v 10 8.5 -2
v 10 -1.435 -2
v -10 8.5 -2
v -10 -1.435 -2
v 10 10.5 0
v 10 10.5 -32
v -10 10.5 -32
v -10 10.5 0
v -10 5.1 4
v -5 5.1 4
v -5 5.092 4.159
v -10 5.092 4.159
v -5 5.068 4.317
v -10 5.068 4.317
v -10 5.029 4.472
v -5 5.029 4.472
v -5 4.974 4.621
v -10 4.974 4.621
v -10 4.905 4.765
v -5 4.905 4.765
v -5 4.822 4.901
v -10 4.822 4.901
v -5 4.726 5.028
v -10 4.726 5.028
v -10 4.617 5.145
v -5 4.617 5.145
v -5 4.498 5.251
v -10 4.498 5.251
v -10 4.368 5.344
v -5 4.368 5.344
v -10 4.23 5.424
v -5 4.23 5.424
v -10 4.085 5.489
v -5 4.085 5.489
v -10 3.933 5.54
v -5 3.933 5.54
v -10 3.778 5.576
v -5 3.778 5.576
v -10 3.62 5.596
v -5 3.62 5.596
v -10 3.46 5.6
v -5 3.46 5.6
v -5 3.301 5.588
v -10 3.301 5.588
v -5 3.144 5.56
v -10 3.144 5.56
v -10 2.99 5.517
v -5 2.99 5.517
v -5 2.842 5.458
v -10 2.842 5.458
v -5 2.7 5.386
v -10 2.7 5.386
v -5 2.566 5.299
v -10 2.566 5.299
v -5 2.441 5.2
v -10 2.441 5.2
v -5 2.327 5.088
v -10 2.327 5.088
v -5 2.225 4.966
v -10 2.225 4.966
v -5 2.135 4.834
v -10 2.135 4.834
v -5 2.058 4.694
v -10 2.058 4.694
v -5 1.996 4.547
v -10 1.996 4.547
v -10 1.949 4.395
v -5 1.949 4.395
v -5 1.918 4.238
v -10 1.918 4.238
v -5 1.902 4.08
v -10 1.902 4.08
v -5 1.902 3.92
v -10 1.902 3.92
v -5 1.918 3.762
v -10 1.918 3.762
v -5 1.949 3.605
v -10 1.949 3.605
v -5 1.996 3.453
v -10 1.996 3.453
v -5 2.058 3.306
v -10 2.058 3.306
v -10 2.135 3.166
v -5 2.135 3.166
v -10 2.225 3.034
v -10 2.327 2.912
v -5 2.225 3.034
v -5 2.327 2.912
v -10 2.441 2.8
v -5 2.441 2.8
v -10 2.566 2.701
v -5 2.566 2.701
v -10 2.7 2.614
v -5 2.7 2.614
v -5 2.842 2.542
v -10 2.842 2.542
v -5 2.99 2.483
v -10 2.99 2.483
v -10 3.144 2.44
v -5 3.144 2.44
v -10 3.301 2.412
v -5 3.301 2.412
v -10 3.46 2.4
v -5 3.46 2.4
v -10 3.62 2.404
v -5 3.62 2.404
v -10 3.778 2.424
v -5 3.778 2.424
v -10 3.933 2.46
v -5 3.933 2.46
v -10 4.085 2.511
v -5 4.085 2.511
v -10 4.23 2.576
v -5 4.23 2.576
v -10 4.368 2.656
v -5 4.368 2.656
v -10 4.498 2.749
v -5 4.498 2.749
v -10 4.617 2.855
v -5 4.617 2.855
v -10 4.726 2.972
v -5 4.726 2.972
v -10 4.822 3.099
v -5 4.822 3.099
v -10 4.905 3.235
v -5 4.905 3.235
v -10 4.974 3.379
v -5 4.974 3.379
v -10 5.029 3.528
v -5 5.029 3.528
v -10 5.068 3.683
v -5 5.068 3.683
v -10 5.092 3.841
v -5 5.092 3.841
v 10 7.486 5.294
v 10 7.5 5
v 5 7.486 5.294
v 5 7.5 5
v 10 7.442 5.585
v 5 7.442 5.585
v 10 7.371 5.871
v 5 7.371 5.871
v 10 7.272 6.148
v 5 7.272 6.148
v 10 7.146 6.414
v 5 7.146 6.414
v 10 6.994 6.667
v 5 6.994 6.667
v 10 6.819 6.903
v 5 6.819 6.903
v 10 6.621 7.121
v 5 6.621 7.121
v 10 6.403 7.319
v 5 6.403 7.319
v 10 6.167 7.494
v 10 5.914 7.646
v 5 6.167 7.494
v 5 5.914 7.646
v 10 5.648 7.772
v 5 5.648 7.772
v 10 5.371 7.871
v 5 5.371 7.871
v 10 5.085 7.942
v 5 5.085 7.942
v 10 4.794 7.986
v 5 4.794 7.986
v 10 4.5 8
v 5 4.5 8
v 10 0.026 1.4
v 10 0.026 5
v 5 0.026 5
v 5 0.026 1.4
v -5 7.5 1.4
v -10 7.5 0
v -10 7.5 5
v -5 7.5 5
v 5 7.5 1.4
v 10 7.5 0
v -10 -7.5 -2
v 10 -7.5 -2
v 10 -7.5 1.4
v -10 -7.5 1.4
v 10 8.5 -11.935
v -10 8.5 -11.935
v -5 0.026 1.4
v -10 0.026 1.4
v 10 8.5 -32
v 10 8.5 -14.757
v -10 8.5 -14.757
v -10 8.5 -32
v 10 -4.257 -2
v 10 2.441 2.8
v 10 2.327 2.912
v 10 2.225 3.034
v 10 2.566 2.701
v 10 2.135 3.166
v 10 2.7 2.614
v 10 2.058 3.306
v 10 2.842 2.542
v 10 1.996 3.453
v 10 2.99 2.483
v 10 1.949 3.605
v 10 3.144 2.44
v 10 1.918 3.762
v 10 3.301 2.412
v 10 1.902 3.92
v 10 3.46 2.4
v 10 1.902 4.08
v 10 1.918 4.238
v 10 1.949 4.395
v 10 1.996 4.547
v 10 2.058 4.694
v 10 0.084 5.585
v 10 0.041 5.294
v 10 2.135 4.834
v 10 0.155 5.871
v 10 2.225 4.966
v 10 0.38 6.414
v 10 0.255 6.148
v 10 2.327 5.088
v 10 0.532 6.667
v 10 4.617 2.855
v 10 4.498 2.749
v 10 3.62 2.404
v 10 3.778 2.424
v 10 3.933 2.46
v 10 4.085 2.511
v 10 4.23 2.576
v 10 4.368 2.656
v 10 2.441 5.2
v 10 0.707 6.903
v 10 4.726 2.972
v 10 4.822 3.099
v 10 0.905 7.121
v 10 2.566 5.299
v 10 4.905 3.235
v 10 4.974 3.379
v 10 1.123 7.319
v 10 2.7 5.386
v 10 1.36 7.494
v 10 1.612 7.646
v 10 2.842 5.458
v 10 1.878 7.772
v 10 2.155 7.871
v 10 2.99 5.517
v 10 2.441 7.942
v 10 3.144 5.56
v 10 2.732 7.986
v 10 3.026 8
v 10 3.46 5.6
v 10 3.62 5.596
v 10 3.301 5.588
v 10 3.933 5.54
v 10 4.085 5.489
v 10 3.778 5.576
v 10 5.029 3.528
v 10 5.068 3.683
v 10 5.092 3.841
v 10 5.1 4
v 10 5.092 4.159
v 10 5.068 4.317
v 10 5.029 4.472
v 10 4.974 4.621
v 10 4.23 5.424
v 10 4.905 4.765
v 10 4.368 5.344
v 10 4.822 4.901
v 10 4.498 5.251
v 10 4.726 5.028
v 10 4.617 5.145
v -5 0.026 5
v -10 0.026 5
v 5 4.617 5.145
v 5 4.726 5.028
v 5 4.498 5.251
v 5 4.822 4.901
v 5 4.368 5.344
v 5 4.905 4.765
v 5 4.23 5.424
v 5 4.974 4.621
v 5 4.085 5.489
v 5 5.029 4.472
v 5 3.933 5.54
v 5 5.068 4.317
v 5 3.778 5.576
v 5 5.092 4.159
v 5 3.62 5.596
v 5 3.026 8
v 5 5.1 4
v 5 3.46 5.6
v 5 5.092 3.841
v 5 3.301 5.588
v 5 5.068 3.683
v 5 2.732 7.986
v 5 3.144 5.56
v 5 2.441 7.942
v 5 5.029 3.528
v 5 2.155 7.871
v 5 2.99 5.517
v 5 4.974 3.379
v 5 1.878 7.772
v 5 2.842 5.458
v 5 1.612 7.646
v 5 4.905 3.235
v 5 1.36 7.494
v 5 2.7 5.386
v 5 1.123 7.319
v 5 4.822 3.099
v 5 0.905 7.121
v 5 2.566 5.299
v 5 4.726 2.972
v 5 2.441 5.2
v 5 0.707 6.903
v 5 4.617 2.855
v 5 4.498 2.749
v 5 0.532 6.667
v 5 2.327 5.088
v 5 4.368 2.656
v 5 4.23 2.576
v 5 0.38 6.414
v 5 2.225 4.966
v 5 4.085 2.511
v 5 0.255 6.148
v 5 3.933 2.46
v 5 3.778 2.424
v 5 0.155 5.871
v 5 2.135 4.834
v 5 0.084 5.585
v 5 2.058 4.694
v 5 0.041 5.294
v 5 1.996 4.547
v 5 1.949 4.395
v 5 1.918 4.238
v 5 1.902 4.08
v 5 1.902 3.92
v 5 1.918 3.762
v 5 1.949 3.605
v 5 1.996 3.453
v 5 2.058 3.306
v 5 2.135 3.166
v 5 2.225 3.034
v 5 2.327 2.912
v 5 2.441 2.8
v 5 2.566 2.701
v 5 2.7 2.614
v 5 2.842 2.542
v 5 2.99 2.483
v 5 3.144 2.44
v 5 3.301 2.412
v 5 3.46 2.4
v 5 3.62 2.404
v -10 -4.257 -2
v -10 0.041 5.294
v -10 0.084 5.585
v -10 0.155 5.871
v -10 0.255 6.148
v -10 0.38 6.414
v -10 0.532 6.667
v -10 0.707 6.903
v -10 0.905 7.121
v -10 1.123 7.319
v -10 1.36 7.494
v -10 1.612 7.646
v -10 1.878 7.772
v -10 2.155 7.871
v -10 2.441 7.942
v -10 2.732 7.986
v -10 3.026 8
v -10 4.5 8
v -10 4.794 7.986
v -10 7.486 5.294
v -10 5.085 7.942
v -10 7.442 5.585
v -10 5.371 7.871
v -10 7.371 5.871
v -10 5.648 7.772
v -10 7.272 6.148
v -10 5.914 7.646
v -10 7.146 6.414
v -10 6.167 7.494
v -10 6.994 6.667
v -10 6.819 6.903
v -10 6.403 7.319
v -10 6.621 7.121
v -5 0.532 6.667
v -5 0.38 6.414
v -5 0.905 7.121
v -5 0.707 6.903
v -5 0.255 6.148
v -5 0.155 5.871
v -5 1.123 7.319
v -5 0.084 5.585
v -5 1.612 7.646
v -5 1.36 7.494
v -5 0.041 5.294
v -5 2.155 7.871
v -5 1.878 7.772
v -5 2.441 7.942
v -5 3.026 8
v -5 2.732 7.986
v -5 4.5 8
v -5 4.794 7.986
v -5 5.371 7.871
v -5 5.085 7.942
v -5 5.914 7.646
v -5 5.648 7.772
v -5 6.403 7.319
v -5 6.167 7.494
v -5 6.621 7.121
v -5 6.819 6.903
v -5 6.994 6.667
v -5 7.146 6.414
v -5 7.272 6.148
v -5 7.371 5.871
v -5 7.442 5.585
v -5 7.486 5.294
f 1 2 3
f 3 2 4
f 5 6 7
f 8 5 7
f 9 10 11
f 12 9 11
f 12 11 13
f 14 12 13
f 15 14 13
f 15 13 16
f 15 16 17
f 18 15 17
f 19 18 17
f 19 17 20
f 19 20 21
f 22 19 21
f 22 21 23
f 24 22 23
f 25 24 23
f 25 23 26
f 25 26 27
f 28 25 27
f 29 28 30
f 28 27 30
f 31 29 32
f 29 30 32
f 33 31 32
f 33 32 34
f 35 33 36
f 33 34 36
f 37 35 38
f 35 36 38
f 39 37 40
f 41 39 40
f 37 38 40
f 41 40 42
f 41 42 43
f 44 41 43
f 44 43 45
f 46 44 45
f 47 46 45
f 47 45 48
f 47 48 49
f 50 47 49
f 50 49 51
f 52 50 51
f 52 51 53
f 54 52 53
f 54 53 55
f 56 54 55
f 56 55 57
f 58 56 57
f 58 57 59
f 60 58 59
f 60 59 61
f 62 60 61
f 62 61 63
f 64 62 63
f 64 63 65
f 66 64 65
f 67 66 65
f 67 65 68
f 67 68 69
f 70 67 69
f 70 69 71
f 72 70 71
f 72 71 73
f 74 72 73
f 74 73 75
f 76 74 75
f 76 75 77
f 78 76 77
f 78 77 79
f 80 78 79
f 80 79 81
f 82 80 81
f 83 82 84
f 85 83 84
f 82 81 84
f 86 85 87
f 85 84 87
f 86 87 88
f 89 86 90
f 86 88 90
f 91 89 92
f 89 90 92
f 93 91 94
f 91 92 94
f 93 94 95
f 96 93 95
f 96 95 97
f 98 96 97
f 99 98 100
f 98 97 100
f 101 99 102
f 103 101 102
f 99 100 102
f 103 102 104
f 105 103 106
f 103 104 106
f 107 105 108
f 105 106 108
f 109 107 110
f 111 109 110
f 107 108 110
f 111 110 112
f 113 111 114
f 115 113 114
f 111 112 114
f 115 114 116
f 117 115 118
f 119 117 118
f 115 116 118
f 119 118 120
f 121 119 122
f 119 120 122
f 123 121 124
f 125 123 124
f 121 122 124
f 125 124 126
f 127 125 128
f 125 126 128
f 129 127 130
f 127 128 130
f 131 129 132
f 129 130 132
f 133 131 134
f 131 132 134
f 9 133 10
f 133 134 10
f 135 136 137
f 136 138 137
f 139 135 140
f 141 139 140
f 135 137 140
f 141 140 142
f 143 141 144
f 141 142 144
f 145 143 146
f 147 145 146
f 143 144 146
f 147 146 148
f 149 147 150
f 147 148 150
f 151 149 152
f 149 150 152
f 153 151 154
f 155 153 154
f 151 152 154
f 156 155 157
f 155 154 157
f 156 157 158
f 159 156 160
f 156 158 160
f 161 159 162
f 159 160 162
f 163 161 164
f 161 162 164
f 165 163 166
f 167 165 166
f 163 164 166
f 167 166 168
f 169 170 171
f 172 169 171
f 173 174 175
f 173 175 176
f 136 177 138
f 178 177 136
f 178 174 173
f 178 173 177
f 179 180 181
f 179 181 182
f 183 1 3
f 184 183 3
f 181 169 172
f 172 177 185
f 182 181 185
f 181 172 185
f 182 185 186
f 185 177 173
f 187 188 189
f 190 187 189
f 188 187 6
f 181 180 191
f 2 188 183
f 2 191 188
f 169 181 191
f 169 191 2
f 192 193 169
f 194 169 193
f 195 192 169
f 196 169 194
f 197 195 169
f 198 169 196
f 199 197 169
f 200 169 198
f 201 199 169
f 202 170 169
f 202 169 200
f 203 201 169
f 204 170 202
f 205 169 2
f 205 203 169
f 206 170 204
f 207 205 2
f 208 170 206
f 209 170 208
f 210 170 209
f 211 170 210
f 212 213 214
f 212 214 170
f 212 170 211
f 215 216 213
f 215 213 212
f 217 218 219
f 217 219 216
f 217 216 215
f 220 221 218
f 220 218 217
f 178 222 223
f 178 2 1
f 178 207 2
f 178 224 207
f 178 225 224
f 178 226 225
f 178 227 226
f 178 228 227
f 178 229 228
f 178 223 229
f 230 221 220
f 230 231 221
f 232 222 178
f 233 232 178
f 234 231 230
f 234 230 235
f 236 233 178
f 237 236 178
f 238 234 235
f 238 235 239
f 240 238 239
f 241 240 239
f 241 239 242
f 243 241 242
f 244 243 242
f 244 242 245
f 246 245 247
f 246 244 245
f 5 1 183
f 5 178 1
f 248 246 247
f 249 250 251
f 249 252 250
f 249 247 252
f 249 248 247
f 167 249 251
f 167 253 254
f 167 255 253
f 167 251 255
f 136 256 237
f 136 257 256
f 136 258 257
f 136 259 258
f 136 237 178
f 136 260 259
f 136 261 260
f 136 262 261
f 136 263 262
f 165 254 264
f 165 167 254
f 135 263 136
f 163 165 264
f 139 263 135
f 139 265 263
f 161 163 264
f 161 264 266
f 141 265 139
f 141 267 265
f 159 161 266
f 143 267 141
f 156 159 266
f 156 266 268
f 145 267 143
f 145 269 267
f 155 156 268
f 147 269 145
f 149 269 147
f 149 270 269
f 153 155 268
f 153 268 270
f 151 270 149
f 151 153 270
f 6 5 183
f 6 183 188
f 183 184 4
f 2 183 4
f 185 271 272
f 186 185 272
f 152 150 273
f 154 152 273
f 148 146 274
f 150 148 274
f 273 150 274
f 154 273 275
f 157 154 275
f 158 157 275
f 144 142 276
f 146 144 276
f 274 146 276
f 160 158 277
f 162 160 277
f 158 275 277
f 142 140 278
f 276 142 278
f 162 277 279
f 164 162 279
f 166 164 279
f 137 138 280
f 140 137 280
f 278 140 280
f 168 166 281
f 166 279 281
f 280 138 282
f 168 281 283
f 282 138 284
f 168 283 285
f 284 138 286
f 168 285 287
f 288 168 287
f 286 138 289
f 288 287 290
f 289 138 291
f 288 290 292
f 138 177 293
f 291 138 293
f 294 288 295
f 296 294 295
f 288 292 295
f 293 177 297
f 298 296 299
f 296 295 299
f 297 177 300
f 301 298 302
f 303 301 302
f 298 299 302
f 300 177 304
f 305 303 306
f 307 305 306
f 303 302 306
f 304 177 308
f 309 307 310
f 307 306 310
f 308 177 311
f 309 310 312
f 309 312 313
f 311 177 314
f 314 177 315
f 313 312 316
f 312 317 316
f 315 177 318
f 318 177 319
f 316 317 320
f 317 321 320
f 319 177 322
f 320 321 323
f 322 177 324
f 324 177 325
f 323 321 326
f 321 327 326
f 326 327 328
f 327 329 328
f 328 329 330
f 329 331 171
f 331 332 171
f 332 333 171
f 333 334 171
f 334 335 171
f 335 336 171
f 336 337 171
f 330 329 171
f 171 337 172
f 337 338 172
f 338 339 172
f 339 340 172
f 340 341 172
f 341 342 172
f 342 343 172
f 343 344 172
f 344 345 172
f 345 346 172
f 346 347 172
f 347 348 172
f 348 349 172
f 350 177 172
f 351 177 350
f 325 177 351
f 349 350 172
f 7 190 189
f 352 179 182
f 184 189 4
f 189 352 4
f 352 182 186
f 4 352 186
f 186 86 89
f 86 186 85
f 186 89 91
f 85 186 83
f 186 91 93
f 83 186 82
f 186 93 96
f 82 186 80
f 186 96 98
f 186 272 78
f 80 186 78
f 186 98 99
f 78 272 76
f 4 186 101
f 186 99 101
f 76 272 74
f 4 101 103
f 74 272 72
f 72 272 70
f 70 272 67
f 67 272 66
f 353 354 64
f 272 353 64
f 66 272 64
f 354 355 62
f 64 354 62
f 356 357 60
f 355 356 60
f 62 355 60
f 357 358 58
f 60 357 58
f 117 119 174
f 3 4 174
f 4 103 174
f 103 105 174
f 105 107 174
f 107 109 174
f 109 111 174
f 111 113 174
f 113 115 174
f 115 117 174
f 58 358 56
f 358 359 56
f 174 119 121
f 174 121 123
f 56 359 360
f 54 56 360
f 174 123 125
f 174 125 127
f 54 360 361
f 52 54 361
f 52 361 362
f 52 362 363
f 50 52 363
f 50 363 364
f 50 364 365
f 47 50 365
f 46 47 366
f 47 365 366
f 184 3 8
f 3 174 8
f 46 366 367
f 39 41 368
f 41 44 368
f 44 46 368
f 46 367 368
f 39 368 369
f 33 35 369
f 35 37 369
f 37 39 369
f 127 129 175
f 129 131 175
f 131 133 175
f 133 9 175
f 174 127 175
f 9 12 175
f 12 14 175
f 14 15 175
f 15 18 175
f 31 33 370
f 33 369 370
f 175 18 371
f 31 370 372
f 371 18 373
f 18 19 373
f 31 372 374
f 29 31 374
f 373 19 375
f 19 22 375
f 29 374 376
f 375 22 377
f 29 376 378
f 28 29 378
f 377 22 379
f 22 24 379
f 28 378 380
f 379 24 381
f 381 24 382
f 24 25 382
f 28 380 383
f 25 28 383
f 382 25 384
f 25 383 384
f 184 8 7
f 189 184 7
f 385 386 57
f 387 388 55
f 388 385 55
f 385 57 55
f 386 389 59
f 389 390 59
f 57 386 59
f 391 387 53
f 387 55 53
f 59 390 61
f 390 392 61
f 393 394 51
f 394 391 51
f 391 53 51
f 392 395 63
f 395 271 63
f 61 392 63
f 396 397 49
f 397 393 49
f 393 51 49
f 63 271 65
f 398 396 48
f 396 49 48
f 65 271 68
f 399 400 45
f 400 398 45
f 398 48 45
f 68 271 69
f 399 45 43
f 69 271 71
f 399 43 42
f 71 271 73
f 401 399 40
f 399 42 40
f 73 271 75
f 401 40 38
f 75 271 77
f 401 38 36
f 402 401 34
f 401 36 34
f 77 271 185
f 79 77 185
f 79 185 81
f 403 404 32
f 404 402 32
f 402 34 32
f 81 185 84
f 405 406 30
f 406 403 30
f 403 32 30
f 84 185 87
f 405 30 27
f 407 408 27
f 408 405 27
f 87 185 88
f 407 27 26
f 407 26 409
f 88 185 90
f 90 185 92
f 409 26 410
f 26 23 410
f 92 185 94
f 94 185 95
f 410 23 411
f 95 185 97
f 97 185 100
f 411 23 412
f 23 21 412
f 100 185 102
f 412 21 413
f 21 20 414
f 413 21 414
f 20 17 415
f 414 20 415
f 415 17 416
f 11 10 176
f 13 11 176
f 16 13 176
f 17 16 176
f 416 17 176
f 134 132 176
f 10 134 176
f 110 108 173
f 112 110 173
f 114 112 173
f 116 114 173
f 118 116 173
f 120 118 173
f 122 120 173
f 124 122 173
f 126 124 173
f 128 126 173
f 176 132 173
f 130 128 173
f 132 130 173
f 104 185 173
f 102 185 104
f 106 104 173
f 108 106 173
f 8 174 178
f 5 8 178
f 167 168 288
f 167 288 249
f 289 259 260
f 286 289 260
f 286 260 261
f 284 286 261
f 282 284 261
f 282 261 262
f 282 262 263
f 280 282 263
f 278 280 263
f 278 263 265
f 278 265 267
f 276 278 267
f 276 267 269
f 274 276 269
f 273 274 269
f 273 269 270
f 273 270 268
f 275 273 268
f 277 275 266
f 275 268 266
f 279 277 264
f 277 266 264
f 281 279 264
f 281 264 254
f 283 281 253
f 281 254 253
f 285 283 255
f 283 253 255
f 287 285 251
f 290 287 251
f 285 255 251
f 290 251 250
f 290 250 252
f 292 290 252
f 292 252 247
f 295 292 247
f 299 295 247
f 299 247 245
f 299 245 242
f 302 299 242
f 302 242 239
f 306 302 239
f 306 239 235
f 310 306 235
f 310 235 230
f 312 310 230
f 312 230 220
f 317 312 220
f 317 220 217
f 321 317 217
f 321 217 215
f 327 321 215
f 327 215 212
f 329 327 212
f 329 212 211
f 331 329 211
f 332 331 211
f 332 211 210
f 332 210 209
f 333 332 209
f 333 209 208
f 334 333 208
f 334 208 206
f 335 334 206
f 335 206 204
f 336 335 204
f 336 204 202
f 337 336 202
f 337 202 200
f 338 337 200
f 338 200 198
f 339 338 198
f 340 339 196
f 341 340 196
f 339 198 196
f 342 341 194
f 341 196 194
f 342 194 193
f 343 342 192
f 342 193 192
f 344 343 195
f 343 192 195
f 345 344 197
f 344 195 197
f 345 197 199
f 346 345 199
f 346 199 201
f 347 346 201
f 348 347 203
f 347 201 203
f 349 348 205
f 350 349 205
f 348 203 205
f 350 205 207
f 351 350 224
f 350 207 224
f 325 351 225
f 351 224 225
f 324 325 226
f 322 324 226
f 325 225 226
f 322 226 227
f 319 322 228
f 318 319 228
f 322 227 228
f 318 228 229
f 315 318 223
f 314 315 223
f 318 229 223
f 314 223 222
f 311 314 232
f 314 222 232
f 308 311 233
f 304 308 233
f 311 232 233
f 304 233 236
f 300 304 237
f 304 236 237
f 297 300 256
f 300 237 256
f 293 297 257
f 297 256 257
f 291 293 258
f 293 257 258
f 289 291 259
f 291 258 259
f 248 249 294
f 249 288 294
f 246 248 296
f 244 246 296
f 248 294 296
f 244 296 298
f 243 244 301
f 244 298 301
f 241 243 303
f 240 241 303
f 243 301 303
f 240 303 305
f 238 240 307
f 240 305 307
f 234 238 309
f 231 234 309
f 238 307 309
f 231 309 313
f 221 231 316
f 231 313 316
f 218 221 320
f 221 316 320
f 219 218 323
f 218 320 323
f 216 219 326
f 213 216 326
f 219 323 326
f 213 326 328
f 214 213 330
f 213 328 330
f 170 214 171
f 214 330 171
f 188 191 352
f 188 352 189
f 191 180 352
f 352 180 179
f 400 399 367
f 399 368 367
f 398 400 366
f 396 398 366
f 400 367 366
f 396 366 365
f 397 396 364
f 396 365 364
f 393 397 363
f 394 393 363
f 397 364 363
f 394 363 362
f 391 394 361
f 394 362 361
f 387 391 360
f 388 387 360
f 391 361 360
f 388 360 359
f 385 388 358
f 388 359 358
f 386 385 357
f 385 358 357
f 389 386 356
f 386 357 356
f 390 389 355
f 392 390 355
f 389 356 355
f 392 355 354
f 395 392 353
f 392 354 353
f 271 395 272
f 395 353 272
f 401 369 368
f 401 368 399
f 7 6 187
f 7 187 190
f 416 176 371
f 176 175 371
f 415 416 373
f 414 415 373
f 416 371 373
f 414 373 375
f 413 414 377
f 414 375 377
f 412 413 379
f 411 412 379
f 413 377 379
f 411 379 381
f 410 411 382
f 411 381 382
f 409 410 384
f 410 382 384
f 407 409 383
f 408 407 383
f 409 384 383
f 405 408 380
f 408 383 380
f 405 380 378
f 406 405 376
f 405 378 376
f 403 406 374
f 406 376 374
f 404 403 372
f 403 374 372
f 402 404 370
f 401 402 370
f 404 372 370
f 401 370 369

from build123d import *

# Parameters (mm, degrees)
BOSS_EXTRUDE1_DEPTH = 8
SKETCH1_3_W         = 10
SKETCH1_3_H         = 7.5
BOSS_EXTRUDE2_DEPTH = 2
SKETCH2_R           = 1.6
CUT_EXTRUDE1_DEPTH  = 23.808989456
CUT_EXTRUDE3_DEPTH  = 8
FILLET1_R           = 3
BOSS_EXTRUDE3_DEPTH = 3
SKETCH5_W           = 20
SKETCH5_H           = 2
BOSS_EXTRUDE4_DEPTH = 30
BOSS_EXTRUDE5_DEPTH = 20
BOSS_EXTRUDE6_DEPTH = 1.4


with BuildPart() as part:
    # Sketch1 → Boss-Extrude1 (new body)
    with BuildSketch(Plane.XY):
        Polygon((-10, 7.5), (-10, -7.5), (10, -7.5), (10, 7.5), (5, 7.5), (5, 0), (-5, 0), (-5, 7.5), align=None)
    extrude(amount=BOSS_EXTRUDE1_DEPTH)

    # Sketch1<3> → Boss-Extrude2 (add)
    with BuildSketch(Plane.XY):
        Polygon((-10, 7.5), (-10, -7.5), (10, -7.5), (10, 7.5), (5, 7.5), (5, 0), (-5, 0), (-5, 7.5), align=None)
        with Locations((0, 3.75)):
            Rectangle(SKETCH1_3_W, SKETCH1_3_H)
    extrude(amount=-BOSS_EXTRUDE2_DEPTH)

    # Sketch2 → Cut-Extrude1 (cut, through all)
    with BuildSketch(Plane(origin=(10, 0, 0), x_dir=(0, 0, -1), z_dir=(1, 0, 0))):
        with Locations(Location((-4, 3.5, 0), (0, 0, 90))):
            Circle(SKETCH2_R)
    extrude(amount=-CUT_EXTRUDE1_DEPTH, mode=Mode.SUBTRACT)

    # Sketch3 → Cut-Extrude3 (cut)
    with BuildSketch(Plane.XY.offset(8)):
        Polygon((10, -7.5), (10, 0.026252142), (5, 0.026252142), (5, 0), (-5, 0), (-5, 0.026252142), (-10, 0.026252142), (-10, -7.5), align=None)
    extrude(amount=-CUT_EXTRUDE3_DEPTH, mode=Mode.SUBTRACT)

    # Fillet1
    fillet1_edges = [part.edges().sort_by_distance(p)[0] for p in [
        (-7.5, 7.5, 8),
        (7.5, 0.026252142, 8),
        (7.5, 7.5, 8),
        (-7.5, 0.026252142, 8),
    ]]
    fillet(fillet1_edges, radius=FILLET1_R)

    # Sketch4 → Boss-Extrude3 (add)
    with BuildSketch(Plane(origin=(0, 7.5, 0), x_dir=(1, 0, 0), z_dir=(0, 1, 0))):
        Polygon((-5, 0), (5, 0), (10, 0), (10, 2), (-10, 2), (-10, 0), align=None)
    extrude(amount=BOSS_EXTRUDE3_DEPTH)

    # Sketch5 → Boss-Extrude4 (add)
    with BuildSketch(Plane(origin=(0, 0, -2), x_dir=(-1, 0, 0), z_dir=(0, 0, -1))):
        with Locations((0, 9.5)):
            Rectangle(SKETCH5_W, SKETCH5_H)
    extrude(amount=BOSS_EXTRUDE4_DEPTH)

    # Sketch8 → Boss-Extrude5 (add)
    with BuildSketch(Plane(origin=(10, 0, 0), x_dir=(0, 0, -1), z_dir=(1, 0, 0))):
        Polygon((14.757135199, 8.5), (11.934636095, 8.5), (2, -1.434636095), (2, -4.257135199), align=None)
    extrude(amount=-BOSS_EXTRUDE5_DEPTH)

    # Sketch9 → Boss-Extrude6 (add)
    with BuildSketch(Plane.XY):
        Polygon((-5, 7.5), (5, 7.5), (5, 0.026252142), (10, 0.026252142), (10, -7.5), (-10, -7.5), (-10, 0.026252142), (-5, 0.026252142), align=None)
    extrude(amount=BOSS_EXTRUDE6_DEPTH)


solid = part.part
